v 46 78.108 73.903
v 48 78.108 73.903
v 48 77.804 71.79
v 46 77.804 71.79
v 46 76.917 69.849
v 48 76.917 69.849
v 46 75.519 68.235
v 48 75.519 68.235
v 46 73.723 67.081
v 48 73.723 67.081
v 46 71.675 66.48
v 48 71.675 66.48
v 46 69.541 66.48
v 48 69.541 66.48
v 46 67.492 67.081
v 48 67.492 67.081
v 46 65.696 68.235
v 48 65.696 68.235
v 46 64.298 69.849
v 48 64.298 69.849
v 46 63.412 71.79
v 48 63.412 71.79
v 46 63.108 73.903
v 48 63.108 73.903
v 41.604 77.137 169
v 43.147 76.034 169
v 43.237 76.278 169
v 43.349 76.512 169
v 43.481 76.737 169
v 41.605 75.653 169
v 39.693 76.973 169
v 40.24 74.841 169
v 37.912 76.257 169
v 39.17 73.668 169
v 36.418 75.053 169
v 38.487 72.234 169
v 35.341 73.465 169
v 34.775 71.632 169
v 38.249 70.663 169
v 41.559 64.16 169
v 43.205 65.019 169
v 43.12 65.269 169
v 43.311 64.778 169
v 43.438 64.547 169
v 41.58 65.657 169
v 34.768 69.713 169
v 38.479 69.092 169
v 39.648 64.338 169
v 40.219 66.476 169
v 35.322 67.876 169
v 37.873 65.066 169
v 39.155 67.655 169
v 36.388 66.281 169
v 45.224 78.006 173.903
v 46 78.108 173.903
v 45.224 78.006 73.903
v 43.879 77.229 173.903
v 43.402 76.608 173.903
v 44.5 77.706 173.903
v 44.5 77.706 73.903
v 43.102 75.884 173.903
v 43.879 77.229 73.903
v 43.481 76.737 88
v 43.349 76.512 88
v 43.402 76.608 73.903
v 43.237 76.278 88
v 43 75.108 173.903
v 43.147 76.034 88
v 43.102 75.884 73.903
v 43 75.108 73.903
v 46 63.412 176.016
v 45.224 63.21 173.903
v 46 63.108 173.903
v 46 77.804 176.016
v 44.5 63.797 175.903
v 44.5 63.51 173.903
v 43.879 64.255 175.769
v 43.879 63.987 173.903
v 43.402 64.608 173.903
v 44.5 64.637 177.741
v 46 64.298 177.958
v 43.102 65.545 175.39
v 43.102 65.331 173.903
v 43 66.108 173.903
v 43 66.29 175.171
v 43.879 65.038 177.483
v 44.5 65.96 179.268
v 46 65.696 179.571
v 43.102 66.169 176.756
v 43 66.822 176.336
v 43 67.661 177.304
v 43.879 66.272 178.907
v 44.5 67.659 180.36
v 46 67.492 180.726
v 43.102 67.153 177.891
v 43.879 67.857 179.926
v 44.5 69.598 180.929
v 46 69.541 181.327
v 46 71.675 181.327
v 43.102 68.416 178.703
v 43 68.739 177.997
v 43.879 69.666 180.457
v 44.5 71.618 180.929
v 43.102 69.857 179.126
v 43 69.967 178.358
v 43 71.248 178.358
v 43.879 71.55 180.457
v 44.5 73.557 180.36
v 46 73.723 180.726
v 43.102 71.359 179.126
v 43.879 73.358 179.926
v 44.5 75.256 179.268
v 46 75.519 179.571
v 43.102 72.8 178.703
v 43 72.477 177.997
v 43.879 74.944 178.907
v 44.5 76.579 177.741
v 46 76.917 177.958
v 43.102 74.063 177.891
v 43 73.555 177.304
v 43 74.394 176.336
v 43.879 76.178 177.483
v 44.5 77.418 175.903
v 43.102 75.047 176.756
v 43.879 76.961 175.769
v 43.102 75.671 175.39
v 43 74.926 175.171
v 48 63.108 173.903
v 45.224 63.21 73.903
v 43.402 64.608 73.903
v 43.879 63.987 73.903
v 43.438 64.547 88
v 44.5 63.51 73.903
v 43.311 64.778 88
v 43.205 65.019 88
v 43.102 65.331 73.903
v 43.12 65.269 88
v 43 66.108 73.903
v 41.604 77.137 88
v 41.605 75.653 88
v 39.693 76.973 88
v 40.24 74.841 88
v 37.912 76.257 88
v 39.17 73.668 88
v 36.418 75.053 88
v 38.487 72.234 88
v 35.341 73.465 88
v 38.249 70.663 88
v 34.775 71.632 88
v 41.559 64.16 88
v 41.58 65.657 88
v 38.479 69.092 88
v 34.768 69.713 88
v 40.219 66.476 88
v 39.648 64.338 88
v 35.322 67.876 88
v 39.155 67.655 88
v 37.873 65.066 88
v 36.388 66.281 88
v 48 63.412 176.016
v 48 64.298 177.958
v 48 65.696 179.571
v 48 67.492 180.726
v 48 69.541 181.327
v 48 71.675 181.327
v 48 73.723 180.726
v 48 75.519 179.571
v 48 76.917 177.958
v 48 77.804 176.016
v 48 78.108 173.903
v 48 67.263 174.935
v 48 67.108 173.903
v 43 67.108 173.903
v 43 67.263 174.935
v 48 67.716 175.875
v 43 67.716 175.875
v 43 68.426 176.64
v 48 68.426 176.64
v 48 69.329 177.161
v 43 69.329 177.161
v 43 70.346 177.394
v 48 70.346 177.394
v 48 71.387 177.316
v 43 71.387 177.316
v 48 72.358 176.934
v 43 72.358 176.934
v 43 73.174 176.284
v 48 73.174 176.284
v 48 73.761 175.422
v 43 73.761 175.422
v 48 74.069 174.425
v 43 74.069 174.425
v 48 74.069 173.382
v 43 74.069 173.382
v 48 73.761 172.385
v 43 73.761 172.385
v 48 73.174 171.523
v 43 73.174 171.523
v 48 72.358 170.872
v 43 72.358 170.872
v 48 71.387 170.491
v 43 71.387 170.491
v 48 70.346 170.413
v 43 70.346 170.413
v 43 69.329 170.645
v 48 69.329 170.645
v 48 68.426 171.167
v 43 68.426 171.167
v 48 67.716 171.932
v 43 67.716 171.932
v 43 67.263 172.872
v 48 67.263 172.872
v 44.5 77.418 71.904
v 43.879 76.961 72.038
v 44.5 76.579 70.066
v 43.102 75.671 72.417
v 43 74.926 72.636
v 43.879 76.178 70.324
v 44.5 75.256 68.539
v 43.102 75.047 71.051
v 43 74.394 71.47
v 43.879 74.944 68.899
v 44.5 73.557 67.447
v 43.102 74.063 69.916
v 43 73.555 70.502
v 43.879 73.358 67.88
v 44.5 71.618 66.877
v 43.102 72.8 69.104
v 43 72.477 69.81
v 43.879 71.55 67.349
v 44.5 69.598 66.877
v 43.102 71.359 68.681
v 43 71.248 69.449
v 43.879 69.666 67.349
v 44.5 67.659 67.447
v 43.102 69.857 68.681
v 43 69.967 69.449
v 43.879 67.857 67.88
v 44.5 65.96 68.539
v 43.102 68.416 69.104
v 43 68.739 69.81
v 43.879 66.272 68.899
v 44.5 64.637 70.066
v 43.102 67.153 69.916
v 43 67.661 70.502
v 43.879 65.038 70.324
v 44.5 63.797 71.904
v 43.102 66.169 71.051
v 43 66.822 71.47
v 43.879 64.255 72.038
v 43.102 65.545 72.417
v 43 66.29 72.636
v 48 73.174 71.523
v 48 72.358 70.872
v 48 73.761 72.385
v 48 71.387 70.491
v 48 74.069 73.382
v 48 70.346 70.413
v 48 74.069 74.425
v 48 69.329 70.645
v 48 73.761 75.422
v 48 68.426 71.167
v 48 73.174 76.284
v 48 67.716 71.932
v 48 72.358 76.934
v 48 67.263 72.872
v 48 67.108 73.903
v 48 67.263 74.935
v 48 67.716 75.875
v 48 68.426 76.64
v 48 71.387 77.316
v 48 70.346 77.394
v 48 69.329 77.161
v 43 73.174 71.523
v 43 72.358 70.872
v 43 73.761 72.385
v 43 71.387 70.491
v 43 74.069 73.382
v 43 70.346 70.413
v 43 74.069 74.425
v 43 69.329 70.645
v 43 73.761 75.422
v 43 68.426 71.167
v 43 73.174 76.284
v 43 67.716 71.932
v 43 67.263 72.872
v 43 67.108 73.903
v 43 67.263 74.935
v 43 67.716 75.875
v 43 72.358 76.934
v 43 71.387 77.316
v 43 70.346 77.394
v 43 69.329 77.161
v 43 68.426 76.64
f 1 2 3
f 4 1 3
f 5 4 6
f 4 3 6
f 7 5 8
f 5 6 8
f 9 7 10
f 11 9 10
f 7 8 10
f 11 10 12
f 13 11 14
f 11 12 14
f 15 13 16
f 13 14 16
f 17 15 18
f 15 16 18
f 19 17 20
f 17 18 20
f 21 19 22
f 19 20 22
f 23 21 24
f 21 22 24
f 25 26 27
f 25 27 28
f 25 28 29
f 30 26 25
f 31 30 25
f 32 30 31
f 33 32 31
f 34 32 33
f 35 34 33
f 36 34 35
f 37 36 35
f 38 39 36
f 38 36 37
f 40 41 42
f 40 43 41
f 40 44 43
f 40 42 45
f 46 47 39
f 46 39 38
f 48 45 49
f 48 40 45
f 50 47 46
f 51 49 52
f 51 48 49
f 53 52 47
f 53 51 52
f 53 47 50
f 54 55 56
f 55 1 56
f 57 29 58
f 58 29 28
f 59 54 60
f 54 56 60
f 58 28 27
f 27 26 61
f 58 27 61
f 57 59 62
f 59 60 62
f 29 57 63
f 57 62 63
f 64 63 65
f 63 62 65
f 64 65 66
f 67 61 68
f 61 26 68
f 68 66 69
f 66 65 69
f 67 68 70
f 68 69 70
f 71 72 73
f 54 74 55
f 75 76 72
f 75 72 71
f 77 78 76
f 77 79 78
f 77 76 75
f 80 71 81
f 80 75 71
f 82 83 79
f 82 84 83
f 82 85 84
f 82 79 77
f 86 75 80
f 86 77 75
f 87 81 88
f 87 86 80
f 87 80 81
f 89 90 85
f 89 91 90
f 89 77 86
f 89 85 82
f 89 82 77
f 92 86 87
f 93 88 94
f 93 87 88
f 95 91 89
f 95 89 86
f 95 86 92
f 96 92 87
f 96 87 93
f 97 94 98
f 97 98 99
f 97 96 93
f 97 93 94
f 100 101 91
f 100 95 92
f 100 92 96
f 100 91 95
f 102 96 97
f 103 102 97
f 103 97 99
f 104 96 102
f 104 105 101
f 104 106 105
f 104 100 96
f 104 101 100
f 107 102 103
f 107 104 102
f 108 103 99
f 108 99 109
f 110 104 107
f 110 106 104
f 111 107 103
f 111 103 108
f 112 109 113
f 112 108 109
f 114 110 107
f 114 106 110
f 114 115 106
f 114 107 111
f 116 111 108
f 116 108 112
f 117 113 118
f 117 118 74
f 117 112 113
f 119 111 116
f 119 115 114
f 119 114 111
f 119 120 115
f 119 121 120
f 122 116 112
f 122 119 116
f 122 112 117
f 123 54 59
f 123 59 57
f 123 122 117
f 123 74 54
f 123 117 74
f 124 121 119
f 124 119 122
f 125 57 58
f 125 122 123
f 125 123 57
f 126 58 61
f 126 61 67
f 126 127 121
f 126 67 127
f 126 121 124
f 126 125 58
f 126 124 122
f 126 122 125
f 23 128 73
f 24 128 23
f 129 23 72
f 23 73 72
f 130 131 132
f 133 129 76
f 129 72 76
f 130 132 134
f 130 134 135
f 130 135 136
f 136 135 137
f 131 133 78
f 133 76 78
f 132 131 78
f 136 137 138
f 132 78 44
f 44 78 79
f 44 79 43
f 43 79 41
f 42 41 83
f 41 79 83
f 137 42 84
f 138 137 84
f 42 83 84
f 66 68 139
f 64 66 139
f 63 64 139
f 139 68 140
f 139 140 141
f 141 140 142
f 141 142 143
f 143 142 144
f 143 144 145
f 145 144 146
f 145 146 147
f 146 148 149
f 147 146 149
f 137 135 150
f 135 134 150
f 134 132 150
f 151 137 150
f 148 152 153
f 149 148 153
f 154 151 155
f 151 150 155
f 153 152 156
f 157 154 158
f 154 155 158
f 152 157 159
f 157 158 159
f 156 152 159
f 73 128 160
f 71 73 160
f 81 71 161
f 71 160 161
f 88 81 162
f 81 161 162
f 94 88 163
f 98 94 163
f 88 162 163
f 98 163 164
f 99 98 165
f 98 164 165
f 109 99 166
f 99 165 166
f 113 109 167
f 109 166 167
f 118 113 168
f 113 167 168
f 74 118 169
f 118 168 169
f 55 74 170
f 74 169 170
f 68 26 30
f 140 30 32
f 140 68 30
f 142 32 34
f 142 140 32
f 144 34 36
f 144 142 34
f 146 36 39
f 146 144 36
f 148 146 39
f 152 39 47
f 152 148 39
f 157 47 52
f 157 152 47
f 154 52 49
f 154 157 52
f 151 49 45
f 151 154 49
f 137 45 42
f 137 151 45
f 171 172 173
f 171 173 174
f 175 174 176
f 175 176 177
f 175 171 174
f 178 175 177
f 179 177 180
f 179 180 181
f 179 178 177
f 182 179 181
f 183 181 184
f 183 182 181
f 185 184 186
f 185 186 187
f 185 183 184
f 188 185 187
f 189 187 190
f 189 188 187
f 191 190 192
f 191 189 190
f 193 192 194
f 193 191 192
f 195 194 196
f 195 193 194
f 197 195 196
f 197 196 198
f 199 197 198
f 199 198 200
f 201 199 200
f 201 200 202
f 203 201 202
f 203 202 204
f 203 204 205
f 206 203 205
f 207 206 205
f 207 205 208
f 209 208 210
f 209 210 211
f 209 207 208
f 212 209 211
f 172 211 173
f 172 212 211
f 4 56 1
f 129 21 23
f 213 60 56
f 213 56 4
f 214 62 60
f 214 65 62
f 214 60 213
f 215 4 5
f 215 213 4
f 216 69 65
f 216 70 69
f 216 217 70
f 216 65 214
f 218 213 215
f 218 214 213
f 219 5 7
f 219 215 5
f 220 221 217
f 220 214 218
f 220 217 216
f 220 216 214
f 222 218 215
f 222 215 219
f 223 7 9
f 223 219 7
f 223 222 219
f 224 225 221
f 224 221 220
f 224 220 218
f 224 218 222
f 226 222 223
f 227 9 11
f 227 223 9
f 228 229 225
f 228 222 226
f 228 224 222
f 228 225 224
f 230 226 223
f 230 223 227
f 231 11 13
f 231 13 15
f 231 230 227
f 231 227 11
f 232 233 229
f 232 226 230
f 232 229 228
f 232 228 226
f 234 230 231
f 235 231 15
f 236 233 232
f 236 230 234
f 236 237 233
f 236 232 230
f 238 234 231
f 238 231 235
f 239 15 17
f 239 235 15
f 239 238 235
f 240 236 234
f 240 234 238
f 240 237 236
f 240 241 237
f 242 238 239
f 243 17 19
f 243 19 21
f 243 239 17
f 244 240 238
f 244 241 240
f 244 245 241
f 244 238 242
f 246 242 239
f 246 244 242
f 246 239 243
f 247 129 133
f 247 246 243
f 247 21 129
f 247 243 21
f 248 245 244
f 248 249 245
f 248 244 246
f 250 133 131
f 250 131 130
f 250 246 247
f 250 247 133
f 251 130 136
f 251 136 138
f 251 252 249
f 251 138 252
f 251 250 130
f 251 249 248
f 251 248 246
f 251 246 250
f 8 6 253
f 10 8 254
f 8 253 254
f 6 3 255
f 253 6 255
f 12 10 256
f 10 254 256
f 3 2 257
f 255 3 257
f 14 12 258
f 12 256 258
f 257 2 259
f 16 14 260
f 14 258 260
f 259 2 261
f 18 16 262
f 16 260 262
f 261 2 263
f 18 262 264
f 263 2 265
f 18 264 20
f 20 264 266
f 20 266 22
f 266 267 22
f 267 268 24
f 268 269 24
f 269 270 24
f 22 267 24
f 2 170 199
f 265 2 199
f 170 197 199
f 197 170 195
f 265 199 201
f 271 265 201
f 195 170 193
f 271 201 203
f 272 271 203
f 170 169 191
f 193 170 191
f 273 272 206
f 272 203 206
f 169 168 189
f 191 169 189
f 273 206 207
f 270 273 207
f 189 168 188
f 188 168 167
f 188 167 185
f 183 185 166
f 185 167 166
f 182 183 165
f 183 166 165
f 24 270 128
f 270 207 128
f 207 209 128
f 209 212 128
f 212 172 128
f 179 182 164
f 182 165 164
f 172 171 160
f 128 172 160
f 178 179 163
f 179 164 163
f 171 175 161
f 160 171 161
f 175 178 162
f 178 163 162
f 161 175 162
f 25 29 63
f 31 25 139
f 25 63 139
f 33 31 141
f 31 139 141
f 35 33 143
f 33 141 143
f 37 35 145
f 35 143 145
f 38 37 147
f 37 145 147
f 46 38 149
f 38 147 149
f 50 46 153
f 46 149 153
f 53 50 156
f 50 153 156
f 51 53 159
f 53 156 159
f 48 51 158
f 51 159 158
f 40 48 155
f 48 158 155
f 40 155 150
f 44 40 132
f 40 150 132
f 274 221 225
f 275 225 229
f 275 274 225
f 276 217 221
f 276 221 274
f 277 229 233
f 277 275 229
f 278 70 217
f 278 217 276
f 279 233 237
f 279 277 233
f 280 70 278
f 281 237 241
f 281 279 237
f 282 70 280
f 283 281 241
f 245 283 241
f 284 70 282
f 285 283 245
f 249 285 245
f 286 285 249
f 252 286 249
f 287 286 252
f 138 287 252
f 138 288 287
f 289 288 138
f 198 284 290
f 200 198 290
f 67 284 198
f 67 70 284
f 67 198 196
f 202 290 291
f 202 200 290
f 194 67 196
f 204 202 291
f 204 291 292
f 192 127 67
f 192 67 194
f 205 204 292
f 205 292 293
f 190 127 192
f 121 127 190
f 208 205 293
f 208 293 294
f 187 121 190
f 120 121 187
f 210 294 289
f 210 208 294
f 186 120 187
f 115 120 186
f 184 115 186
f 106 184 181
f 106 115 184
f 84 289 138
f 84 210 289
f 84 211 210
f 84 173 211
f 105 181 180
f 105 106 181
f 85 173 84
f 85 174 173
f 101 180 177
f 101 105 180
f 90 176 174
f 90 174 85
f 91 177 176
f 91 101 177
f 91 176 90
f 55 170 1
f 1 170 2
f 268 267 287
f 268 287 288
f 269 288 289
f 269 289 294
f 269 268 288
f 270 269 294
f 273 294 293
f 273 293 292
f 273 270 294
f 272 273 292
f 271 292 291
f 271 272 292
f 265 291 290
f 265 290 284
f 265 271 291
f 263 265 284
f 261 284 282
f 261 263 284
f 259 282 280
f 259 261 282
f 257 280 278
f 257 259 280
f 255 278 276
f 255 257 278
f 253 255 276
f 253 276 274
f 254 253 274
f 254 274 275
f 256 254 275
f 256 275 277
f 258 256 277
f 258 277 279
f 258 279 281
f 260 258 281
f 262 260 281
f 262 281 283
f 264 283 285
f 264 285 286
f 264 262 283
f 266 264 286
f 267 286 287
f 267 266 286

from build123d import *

# Parameters (mm, degrees)
SKETCH002_R                = 3.5
EXTRUDE002_DEPTH           = 5
FILLET002_R                = 3
EXTRUDE025_DEPTH           = 81
EXTRUDE025_ROLL_ANGLE      = -90
EXTRUDE025_PLACEMENT_ANGLE = 180


with BuildPart() as palo_2_hombro:
    # Sketch002 → Extrude002 (new body)
    with BuildSketch(Plane(origin=(0, 0, 0), x_dir=(0, -1, 0), z_dir=(-1, 0, 0))):
        with BuildLine():
            ThreePointArc((-63.107885, 173.903324), (-70.607885, 181.403324), (-78.107885, 173.903324))
            Line((-78.107885, 173.903324), (-78.107885, 73.903324))
            ThreePointArc((-78.107885, 73.903324), (-70.607885, 66.403324), (-63.107885, 73.903324))
            Line((-63.107885, 173.903324), (-63.107885, 73.903324))
        make_face()
        with Locations((-70.607885, 73.903324)):
            Circle(SKETCH002_R, mode=Mode.SUBTRACT)
        with Locations((-70.607885, 173.903324)):
            Circle(SKETCH002_R, mode=Mode.SUBTRACT)
    extrude(amount=EXTRUDE002_DEPTH)


with BuildPart() as palo_2_hombro_1:
    # Extrude002 placement: moved
    add(palo_2_hombro.part.moved(Location((48, 0, 0))))

    # Fillet002
    fillet002_edges = [palo_2_hombro_1.edges().sort_by_distance(p)[0] for p in [
        (43, 78.107885, 123.903324),
    ]]
    fillet(fillet002_edges, radius=FILLET002_R)


with BuildPart() as fusion029:
    # Sketch026 → Extrude025 (new body)
    with BuildSketch(Plane.XZ):
        with BuildLine():
            ThreePointArc((-3.873562, -5.219724), (6.5, 0), (-3.873562, 5.219724))
            ThreePointArc((-3.873562, -5.219724), (2.950526, 0), (-3.873562, 5.219724))
        make_face()
    extrude(amount=EXTRUDE025_DEPTH)


with BuildPart() as fusion029_1:
    # Extrude025 roll: moved
    add(fusion029.part.rotate(Axis((0, 0, 0), (1, 0, 0)), EXTRUDE025_ROLL_ANGLE))


with BuildPart() as fusion029_2:
    # Extrude025 placement: moved
    add(fusion029_1.part.moved(Location((41.2, 70.65, 88))).rotate(Axis((41.2, 70.65, 88), (0, 0, 1)), EXTRUDE025_PLACEMENT_ANGLE))

    # Fusion029: union palo 2 hombro
    add(palo_2_hombro_1.part)


solid = fusion029_2.part
